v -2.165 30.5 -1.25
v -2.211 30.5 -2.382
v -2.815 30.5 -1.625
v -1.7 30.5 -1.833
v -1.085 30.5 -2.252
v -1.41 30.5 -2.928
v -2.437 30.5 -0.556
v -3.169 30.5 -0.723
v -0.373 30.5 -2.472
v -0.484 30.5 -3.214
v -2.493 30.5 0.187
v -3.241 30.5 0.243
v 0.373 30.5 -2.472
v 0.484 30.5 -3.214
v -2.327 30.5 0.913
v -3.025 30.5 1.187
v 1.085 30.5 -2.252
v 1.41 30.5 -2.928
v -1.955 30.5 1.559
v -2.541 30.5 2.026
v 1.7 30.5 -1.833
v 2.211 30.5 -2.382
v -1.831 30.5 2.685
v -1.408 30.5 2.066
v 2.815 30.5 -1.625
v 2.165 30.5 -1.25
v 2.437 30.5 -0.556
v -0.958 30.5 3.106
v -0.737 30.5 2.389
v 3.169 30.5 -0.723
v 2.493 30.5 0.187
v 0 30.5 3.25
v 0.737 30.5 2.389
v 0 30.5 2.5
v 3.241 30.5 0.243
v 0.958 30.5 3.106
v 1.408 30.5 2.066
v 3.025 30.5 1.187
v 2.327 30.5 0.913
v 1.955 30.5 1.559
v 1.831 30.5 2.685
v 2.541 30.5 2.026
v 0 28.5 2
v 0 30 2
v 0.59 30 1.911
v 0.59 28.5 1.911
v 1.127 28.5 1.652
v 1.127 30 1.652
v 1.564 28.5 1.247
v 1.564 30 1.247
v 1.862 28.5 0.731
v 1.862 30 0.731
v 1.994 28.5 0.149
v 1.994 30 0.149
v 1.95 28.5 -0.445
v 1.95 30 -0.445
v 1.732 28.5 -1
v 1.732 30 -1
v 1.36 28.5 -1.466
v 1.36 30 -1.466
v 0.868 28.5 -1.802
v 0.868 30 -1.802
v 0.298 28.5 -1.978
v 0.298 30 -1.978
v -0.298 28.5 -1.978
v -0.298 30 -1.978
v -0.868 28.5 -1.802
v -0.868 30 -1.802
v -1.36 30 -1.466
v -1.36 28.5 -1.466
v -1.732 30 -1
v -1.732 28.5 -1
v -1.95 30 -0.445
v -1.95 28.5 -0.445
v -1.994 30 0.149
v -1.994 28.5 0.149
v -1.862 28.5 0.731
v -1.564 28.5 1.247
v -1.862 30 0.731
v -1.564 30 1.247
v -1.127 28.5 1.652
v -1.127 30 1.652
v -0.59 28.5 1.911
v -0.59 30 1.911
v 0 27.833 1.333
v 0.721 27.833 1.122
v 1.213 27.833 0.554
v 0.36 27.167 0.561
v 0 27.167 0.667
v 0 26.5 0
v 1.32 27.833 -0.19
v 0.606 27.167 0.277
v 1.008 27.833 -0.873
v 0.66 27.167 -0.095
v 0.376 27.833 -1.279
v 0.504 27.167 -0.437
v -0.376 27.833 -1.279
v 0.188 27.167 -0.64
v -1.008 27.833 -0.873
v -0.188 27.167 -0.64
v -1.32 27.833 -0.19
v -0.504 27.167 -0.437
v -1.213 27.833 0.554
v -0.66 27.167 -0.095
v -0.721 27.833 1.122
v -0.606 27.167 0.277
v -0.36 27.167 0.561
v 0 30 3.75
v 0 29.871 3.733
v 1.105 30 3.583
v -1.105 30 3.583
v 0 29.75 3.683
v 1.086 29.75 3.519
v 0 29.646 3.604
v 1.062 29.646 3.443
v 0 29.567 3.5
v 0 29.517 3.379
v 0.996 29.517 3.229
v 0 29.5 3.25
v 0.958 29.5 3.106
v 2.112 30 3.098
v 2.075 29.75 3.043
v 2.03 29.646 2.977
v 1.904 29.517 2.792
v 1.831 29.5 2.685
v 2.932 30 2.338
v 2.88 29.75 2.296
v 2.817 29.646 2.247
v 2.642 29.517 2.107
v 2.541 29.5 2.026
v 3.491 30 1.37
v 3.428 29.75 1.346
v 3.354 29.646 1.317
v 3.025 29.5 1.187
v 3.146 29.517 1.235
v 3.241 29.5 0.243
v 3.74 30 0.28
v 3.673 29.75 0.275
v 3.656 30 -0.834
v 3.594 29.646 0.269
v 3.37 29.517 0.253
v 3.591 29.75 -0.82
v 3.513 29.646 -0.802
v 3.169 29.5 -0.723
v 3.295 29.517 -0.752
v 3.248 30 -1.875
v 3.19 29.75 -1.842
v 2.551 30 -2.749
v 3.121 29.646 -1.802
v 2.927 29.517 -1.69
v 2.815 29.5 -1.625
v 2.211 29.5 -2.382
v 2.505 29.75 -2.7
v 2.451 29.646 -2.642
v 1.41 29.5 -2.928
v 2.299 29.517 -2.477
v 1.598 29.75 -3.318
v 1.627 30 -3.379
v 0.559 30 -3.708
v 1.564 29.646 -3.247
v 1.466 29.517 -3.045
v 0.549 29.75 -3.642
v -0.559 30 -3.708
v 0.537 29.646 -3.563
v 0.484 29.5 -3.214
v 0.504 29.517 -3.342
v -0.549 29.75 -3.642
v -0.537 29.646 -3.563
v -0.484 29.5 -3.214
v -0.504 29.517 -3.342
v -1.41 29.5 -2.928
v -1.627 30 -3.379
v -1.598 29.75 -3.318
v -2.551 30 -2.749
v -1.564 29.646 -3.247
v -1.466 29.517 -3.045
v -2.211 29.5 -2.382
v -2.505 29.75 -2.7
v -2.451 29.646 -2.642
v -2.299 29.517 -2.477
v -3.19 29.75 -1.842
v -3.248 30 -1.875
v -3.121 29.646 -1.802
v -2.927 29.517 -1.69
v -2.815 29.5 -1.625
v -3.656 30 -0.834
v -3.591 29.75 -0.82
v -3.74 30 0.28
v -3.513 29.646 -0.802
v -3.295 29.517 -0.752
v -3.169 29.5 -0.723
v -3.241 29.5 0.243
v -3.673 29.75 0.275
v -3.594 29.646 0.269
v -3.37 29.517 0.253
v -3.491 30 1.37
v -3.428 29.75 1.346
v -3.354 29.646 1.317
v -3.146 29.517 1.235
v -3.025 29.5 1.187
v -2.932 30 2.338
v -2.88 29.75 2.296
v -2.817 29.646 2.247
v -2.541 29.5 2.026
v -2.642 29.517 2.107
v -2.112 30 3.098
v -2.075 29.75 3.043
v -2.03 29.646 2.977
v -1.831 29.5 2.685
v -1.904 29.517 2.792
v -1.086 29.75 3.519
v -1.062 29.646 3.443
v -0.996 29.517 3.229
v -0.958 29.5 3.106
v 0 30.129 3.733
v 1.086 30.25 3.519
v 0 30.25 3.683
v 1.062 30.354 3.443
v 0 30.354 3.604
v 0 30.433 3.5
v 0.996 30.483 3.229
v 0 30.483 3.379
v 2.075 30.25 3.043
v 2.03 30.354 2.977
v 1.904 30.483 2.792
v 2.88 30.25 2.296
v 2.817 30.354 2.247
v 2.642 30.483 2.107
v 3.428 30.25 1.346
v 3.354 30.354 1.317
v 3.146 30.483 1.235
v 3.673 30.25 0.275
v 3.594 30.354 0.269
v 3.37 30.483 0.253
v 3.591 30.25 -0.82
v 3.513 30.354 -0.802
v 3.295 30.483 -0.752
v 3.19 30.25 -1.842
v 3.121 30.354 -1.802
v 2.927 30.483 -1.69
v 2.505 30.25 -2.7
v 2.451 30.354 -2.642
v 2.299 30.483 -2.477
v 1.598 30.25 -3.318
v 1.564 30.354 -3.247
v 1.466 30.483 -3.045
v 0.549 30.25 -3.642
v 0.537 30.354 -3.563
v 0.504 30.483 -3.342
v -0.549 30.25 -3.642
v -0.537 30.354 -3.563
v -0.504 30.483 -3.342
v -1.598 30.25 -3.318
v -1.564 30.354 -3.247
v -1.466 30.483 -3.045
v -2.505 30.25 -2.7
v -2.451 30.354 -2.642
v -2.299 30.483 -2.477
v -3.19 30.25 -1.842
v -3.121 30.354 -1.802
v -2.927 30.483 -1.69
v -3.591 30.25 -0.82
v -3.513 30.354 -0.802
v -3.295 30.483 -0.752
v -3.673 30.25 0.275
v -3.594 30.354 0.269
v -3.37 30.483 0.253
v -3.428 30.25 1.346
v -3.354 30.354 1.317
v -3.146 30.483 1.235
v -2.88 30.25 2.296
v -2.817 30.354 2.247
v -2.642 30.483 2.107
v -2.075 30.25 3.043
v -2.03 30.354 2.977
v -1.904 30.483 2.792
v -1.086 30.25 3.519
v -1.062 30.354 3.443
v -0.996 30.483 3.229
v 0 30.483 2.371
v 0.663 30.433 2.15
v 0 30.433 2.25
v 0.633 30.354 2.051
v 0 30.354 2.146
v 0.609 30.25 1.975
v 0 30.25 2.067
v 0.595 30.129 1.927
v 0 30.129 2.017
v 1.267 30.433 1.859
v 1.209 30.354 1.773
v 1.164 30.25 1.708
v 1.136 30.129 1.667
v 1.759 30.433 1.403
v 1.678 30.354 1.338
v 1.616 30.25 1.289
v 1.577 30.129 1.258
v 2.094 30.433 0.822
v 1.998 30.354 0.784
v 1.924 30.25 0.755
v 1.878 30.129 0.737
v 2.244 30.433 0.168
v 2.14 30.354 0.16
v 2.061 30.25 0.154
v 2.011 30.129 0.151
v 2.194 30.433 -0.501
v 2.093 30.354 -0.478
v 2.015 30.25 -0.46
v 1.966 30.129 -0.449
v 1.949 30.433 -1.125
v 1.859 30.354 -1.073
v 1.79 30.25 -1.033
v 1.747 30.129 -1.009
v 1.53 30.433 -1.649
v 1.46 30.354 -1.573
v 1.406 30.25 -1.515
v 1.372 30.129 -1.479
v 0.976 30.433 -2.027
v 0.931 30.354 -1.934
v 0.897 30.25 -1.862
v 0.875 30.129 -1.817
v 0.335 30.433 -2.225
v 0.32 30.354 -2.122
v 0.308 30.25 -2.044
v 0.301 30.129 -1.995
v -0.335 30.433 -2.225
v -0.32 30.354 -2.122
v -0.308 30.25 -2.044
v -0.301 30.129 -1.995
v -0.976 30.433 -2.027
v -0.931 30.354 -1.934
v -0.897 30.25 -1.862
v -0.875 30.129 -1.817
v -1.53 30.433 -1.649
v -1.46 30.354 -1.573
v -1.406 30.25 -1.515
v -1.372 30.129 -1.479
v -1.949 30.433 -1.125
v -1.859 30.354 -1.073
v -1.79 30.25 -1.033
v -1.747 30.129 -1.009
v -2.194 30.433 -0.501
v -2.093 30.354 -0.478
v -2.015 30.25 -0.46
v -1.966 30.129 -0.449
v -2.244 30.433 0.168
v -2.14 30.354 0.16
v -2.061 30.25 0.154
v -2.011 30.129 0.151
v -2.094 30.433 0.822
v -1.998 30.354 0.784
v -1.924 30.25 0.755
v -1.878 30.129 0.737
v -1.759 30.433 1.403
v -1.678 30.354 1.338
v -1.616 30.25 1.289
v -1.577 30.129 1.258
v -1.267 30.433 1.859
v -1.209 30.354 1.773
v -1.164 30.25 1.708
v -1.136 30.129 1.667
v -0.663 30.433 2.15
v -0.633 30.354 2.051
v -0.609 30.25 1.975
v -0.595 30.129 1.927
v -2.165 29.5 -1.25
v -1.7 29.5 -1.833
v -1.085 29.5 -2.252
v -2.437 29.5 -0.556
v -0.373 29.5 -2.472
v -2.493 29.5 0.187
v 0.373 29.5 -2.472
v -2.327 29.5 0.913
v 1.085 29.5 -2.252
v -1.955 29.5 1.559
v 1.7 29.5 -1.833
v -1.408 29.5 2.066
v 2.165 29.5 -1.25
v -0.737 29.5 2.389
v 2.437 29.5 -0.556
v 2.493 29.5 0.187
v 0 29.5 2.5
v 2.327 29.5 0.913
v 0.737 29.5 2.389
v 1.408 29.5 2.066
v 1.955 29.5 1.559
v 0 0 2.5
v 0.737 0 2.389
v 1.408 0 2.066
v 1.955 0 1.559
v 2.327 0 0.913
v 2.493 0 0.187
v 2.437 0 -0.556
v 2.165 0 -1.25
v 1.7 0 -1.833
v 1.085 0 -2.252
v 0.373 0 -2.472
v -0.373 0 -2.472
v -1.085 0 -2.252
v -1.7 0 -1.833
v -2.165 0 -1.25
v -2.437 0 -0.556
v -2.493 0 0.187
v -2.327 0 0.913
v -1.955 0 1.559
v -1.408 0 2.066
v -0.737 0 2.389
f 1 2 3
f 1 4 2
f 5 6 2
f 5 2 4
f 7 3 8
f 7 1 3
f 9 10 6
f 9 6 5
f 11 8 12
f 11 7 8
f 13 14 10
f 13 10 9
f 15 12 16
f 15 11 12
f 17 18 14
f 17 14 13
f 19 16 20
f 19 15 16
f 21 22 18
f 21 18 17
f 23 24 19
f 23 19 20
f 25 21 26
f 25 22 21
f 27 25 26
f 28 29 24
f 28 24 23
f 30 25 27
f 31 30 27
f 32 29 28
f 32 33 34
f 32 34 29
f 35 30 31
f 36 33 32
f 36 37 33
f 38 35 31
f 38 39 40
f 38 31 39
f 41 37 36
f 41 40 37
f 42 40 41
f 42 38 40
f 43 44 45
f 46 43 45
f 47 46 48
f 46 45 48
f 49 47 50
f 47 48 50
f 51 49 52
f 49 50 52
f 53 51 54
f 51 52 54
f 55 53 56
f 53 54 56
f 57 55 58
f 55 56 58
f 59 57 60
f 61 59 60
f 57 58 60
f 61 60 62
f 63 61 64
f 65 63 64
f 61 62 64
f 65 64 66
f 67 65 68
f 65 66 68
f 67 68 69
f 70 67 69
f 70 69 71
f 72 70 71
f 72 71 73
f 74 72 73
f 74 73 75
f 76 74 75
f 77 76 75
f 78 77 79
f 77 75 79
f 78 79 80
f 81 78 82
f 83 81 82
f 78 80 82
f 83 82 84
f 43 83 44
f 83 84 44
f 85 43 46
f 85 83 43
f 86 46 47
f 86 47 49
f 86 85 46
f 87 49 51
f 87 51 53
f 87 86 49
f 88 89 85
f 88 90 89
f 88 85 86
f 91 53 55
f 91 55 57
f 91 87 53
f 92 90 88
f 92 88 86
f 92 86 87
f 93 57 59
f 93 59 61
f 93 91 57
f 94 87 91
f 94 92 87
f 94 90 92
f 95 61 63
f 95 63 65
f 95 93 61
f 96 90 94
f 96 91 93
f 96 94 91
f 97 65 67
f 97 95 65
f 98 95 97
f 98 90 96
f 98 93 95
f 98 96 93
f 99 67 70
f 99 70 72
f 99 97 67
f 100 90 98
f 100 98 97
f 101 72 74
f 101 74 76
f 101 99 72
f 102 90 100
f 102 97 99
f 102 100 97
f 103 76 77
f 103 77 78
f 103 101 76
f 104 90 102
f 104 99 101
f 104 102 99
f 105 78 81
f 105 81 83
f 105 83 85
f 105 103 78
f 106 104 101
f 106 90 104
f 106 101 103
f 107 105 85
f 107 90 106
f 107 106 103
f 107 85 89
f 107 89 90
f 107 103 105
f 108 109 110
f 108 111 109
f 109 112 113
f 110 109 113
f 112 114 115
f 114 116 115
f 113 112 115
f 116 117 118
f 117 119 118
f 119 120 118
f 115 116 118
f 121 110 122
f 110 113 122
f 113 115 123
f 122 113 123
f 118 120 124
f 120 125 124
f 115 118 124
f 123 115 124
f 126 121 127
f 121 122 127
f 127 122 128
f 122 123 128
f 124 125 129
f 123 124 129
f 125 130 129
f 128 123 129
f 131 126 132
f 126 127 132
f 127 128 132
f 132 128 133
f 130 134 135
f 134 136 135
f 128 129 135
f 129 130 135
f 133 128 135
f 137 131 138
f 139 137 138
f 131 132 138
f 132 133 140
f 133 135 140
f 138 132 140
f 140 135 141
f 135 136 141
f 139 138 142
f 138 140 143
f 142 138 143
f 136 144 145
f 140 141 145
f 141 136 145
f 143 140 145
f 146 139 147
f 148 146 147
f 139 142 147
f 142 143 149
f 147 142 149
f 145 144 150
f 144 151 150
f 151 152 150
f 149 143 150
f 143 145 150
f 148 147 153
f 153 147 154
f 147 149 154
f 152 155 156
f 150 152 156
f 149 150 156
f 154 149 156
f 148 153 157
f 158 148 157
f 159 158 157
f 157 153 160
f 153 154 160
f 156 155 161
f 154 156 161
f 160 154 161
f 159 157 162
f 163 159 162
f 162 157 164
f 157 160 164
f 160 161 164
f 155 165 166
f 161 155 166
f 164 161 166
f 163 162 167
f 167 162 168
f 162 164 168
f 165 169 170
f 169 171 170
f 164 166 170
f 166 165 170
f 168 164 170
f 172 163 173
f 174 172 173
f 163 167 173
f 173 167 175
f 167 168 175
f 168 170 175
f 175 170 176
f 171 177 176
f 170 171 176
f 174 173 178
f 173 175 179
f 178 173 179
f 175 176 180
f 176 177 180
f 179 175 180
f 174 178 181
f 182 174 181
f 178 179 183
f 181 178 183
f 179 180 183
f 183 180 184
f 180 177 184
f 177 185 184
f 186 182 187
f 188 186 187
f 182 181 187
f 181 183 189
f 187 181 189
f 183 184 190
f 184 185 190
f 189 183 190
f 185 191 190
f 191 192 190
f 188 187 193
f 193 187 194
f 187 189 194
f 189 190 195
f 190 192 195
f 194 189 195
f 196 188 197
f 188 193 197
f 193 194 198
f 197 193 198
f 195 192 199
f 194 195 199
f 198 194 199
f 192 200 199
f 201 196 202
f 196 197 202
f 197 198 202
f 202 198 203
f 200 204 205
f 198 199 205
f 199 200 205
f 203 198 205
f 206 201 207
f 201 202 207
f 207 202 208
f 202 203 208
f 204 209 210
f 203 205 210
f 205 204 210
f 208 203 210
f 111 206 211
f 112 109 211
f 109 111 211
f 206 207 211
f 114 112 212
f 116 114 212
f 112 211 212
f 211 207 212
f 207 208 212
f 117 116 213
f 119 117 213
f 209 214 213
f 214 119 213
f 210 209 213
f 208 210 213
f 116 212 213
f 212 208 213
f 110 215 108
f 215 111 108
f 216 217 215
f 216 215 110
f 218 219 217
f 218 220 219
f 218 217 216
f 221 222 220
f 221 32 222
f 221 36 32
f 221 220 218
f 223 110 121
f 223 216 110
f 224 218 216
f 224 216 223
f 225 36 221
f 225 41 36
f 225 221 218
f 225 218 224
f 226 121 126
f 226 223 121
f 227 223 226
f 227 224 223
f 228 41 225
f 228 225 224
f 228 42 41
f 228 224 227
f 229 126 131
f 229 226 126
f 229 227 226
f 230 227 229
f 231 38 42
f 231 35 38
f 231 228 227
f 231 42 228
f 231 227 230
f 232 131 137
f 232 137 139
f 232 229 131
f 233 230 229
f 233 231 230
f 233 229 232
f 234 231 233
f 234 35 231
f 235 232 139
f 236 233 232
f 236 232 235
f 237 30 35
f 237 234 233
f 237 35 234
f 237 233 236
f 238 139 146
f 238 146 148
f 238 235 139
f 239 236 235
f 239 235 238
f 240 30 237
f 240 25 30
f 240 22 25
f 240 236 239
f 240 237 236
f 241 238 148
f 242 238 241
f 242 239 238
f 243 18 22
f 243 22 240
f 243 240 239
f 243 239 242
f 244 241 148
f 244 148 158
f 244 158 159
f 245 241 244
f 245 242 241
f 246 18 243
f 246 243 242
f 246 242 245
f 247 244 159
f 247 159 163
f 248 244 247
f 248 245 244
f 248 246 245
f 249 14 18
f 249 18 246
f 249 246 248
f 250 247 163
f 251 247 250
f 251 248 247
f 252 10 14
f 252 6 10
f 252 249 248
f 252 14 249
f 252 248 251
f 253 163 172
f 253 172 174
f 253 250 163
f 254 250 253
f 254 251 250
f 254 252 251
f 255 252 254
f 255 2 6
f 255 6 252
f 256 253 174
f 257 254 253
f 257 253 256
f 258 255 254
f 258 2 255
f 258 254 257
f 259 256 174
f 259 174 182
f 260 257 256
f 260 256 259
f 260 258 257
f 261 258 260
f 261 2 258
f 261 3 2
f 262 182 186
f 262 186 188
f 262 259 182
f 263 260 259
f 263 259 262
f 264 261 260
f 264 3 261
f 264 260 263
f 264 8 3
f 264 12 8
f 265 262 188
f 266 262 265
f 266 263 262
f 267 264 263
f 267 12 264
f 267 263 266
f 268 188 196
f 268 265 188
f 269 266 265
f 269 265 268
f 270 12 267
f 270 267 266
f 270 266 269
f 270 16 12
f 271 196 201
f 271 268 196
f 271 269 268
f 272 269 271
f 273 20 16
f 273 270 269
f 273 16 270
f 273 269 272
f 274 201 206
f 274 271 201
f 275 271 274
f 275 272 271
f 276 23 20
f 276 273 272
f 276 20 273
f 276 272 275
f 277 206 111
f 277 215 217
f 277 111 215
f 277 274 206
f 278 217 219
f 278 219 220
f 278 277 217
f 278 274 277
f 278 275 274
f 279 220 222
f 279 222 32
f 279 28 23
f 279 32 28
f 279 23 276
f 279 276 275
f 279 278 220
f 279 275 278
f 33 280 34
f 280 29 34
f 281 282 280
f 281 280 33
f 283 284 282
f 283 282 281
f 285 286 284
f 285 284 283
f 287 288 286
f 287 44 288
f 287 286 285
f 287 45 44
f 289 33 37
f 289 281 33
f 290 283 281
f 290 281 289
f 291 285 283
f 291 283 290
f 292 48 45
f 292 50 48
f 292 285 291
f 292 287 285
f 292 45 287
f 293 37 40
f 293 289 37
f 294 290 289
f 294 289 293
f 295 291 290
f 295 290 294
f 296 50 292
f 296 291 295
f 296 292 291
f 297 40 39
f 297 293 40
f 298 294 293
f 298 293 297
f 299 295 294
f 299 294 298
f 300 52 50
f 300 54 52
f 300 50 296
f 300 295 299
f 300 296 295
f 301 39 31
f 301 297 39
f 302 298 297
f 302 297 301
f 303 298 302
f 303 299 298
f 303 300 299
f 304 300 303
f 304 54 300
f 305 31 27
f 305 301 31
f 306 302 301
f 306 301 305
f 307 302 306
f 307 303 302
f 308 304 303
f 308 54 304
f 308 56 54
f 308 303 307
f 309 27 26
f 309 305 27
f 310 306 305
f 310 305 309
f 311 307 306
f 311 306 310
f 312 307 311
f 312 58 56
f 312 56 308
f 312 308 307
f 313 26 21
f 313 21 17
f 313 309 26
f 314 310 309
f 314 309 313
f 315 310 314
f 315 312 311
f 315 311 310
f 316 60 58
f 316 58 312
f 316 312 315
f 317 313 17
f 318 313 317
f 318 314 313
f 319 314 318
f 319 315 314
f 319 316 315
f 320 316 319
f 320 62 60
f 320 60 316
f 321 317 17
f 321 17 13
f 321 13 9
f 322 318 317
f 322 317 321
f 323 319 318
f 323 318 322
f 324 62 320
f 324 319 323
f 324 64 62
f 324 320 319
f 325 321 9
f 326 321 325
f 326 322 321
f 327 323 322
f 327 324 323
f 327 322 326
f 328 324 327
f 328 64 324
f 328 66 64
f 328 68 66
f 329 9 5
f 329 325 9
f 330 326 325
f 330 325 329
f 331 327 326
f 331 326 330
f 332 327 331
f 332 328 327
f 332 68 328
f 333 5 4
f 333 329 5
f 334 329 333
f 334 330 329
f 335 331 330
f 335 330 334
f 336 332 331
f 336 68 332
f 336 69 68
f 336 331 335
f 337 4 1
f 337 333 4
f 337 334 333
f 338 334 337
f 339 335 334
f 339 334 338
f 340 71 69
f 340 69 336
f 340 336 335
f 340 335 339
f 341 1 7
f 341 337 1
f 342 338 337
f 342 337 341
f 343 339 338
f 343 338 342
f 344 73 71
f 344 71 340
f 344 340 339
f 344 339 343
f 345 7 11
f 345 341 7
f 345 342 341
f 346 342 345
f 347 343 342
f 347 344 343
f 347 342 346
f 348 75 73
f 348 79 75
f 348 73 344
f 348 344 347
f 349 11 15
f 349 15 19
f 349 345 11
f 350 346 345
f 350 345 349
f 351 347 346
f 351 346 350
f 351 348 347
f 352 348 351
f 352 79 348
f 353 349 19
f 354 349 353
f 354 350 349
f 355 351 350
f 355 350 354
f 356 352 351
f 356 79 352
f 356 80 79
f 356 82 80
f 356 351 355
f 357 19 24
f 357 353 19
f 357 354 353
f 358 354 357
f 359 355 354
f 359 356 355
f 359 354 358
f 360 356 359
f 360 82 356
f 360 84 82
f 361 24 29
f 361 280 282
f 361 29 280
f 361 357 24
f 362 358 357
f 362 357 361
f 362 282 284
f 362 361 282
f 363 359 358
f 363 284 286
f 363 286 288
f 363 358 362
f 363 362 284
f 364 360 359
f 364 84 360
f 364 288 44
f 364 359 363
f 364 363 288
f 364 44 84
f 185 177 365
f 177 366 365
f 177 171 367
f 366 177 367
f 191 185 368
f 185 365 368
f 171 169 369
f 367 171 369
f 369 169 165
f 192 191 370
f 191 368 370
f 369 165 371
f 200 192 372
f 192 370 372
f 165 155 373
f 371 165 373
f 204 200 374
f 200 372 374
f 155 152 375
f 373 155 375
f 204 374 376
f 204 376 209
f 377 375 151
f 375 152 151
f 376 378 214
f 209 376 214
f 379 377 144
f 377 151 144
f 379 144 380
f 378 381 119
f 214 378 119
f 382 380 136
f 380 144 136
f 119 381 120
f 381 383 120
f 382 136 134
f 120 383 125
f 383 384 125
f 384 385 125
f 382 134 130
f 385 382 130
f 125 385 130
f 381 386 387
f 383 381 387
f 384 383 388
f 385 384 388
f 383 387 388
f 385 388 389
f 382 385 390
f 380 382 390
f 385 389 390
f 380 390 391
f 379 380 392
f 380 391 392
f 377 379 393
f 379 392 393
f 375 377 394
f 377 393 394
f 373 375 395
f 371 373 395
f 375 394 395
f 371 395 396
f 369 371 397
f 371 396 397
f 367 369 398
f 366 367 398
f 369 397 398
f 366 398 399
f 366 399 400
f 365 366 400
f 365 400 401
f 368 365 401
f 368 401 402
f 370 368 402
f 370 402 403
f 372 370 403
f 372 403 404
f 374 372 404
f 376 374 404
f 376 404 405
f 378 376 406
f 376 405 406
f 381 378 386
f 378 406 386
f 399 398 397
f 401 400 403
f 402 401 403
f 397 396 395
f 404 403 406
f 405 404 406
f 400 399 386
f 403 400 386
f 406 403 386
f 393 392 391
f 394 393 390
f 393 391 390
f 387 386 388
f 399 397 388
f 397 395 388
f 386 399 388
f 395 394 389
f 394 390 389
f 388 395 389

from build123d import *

# Parameters (mm, degrees)
SKETCH1_R           = 2.5
BOSS_EXTRUDE1_DEPTH = 29.5
SKETCH2_R           = 3.75
BOSS_EXTRUDE2_DEPTH = 1
SKETCH3_R           = 2
CUT_EXTRUDE2_DEPTH  = 2
FILLET1_R           = 0.5


with BuildPart() as part:
    # Sketch1 → Boss-Extrude1 (new body)
    with BuildSketch(Plane(origin=(0, 0, 0), x_dir=(1, 0, 0), z_dir=(0, 1, 0))):
        with Locations(Location((0, 0, 0), (0, 0, 270))):
            Circle(SKETCH1_R)
    extrude(amount=BOSS_EXTRUDE1_DEPTH)

    # Sketch2 → Boss-Extrude2 (add)
    with BuildSketch(Plane(origin=(0, 29.5, 0), x_dir=(1, 0, 0), z_dir=(0, 1, 0))):
        with Locations(Location((0, 0, 0), (0, 0, 270))):
            Circle(SKETCH2_R)
    extrude(amount=BOSS_EXTRUDE2_DEPTH)

    # Sketch3 → Cut-Extrude2 (cut)
    with BuildSketch(Plane(origin=(0, 30.5, 0), x_dir=(1, 0, 0), z_dir=(0, 1, 0))):
        with Locations(Location((0, 0, 0), (0, 0, 270))):
            Circle(SKETCH3_R)
    extrude(amount=-CUT_EXTRUDE2_DEPTH, mode=Mode.SUBTRACT)

    # Sketch4 → Cut-Revolve1 (revolve, cut)
    with BuildSketch(Plane.XY, mode=Mode.PRIVATE) as cut_revolve1_sk:
        Polygon((-2, 28.5), (0, 26.5), (0, 28.5), align=None)
    revolve(cut_revolve1_sk.sketch.rotate(Axis((0, 26.5, 0), (0, 1, 0)), 90), axis=Axis((0, 26.5, 0), (0, 1, 0)), mode=Mode.SUBTRACT)

    # Fillet1
    fillet1_edges = [part.edges().sort_by_distance(p)[0] for p in [
        (0, 30.5, -2),
        (0, 29.5, -3.75),
        (0, 30.5, -3.75),
    ]]
    fillet(fillet1_edges, radius=FILLET1_R - 0.0001)  # a hair under: the kernel refuses the full size


solid = part.part
